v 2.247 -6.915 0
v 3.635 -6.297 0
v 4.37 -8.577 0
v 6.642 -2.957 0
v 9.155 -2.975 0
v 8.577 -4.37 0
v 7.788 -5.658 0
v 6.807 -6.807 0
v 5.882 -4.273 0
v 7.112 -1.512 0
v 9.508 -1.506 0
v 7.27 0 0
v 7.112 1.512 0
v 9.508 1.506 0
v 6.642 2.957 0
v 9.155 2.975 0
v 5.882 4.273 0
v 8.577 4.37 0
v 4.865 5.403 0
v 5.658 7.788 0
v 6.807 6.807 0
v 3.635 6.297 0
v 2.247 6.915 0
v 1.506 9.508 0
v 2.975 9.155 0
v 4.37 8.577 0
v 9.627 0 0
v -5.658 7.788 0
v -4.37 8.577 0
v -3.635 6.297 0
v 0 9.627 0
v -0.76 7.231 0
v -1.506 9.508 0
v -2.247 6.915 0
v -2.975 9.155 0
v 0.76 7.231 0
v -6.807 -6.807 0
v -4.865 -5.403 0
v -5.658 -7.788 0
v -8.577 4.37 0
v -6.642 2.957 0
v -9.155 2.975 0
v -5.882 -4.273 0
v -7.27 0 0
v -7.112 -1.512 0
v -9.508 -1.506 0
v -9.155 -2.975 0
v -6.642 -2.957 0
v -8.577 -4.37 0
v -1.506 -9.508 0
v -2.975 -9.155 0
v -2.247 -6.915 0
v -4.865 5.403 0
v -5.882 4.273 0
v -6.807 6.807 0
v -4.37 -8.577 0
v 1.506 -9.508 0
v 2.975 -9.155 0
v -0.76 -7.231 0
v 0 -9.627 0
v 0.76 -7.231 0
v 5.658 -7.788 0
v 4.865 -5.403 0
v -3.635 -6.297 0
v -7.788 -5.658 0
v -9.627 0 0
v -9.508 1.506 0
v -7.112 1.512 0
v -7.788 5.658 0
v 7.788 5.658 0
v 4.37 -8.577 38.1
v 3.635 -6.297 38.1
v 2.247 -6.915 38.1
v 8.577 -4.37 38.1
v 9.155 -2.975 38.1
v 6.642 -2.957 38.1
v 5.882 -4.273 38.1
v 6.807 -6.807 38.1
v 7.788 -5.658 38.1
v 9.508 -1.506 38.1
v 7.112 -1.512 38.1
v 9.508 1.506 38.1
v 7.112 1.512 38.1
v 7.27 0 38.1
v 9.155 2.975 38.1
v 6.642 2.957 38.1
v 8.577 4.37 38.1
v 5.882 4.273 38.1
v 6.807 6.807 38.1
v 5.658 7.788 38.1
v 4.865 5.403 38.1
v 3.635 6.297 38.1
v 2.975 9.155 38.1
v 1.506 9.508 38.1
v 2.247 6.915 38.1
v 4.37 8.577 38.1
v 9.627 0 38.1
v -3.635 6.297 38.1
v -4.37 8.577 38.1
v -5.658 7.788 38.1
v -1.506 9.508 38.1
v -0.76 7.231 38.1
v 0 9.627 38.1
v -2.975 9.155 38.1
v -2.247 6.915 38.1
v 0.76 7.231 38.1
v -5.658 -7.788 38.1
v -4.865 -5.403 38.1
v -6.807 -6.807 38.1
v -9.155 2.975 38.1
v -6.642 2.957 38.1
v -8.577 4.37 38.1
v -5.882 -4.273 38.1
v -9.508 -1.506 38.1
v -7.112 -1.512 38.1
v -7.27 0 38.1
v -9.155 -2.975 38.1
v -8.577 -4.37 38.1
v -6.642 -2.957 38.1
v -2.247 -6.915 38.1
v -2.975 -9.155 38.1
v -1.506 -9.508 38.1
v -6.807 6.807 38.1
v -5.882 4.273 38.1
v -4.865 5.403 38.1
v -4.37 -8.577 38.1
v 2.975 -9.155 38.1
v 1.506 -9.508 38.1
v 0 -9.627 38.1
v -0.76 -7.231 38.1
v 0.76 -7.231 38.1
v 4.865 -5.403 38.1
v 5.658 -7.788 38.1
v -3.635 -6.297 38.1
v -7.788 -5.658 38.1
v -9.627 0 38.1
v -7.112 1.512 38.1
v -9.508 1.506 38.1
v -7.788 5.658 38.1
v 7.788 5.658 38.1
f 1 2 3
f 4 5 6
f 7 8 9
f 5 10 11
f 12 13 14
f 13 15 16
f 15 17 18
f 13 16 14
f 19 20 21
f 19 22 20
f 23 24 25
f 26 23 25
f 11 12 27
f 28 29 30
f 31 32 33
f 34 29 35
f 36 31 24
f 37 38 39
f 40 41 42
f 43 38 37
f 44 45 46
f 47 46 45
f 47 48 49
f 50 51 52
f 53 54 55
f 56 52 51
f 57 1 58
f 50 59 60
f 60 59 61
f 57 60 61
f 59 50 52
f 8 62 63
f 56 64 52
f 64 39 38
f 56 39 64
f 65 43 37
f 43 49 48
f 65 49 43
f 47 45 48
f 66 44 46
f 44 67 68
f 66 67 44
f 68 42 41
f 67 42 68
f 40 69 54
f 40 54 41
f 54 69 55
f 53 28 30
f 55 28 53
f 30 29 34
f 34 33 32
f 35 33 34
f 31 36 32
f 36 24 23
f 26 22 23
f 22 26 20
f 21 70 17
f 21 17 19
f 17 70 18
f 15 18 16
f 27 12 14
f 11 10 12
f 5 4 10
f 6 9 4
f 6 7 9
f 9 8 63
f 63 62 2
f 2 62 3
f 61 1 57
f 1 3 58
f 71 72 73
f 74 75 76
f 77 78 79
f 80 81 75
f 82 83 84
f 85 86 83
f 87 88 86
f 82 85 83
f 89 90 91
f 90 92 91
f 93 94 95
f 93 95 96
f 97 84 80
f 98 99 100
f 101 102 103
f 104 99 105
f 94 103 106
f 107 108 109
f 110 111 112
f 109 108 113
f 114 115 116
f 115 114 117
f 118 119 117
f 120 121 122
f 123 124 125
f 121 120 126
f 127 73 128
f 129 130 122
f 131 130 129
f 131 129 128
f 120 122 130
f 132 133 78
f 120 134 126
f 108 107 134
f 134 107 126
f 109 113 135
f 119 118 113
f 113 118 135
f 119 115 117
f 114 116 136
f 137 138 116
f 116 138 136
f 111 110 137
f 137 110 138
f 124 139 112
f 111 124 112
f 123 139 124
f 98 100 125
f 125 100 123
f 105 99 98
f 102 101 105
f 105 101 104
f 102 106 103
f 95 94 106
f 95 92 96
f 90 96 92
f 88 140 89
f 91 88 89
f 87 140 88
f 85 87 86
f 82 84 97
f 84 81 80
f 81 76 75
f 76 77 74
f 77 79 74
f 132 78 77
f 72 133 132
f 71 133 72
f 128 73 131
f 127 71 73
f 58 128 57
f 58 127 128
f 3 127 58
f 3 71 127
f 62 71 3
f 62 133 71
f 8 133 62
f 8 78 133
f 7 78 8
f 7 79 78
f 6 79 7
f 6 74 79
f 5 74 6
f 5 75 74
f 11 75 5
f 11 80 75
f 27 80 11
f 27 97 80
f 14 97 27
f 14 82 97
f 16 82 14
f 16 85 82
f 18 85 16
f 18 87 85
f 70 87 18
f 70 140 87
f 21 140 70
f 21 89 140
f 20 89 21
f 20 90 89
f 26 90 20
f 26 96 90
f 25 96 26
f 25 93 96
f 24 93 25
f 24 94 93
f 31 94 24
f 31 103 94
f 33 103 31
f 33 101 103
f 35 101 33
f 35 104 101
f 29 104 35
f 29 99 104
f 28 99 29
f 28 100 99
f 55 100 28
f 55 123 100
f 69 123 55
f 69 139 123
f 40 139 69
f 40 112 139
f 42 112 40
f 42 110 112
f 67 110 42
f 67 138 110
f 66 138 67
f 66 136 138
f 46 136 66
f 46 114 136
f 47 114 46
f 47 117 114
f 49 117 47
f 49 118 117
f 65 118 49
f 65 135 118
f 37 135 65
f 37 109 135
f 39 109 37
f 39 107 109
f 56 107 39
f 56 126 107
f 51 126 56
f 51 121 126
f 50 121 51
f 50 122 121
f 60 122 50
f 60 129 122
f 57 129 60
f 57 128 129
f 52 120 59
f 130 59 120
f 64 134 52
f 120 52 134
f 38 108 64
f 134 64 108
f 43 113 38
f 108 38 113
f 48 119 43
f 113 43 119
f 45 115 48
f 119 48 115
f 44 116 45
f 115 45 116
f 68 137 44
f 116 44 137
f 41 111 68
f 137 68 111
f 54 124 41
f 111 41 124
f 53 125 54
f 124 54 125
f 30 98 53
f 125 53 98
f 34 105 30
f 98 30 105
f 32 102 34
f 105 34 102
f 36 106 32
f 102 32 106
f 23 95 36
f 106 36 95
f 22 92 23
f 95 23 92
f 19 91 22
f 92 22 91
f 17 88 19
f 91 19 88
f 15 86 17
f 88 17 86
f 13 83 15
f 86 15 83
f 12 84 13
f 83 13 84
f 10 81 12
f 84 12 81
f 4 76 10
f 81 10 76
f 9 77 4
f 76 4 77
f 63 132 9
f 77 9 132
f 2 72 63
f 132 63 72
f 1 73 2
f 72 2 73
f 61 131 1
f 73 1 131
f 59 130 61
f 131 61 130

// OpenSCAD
// file: ../Components/Pipe Insert.scad
use <../Vitamins/Pipe.scad>;

//Spec_TubingThreeQuarterByFiveEighthInch
//Spec_PipeThreeQuarterInchSch80
//Spec_PipeThreeQuarterInchSch80Stainless
//Spec_PipeOneInchSch80
module PipeInsert2d(pipeSpec=Spec_PipeThreeQuarterInchSch80Stainless(),
                    pipeClearance=PipeClearanceSnug(),
                    length=1) {
  outsideRadius = PipeInnerRadius(pipe=pipeSpec, clearance=pipeClearance, clearanceSign=-1);
  
  difference() {
    circle(r=outsideRadius, $fn=PipeFn(pipeSpec));
    children();
  }
}

scale(25.4)
render()
linear_extrude(height=1.5)
PipeInsert2d(pipeClearance=undef)
circle(r=(3/8/2)+0.002, $fn=20);
// file: ../Vitamins/Rod.scad
RodDiameter       = 1;
RodRadius         = 2;
RodClearanceSnug  = 3;
RodClearanceLoose = 4;
RodFn             = 5;

function RodClearanceSnug()  = RodClearanceSnug;
function RodClearanceLoose() = RodClearanceLoose;

RodBicNozzle = [
  [RodDiameter, 0.093],
  [RodRadius, 0.093/2],
  [RodClearanceSnug, 0.04],
  [RodClearanceLoose, 0.06],
  [RodFn, 5]
];
function Spec_RodBicNozzle() = RodBicNozzle;

RodBicFlint = [
  [RodDiameter, 0.0985],
  [RodRadius, 0.0985/2],
  [RodClearanceSnug, 0.04],
  [RodClearanceLoose, 0.06],
  [RodFn, 5]
];
function Spec_RodBicFlint() = RodBicFlint;

RodOneEighthInch = [
  [RodDiameter, 1/8],
  [RodRadius, 1/8/2],
  [RodClearanceSnug, 0.01],
  [RodClearanceLoose, 0.02],
  [RodFn, 8]
];
function Spec_RodOneEighthInch() = RodOneEighthInch;

RodOneQuarterInch = [
  [RodDiameter,       1/4],
  [RodRadius,         1/4/2],
  [RodClearanceSnug,  0.027],
  [RodClearanceLoose, 0.035],
  [RodFn,             12]
];
function Spec_RodOneQuarterInch() = RodOneQuarterInch;

RodFiveSixteenthInch = [
  [RodDiameter,       5/16],
  [RodRadius,         5/16/2],
  [RodClearanceSnug,  0.025],
  [RodClearanceLoose, 0.03],
  [RodFn,             16]
];
function Spec_RodFiveSixteenthInch() = RodFiveSixteenthInch;

RodThreeQuarterInchTubing = [
  [RodDiameter,       0.758],
  [RodRadius,         0.758/2],
  [RodClearanceSnug,  0.023],
  [RodClearanceLoose, 0.029],
  [RodFn,             30]
];
function Spec_RodThreeQuarterInchTubing() = RodThreeQuarterInchTubing;

/**
 * Lookup the diameter of a rod.
 * @param rod The rod to lookup.
 * @param clearance The RodClearance to use.
 */
function RodDiameter(rod=undef, clearance=undef)
           = lookup(RodDiameter, rod)
          + (clearance != undef ? lookup(clearance, rod) : 0);

/**
 * Lookup the radius of a rod.
 * @param rod The rod to lookup.
 * @param clearance The RodClearance to use.
 */
function RodRadius(rod=undef, clearance=undef) = RodDiameter(rod, clearance)/2;

/**
 * Lookup the $fn value for a rod, optionally overriding it
 * @param rod The rod to lookup.
 * @param $fn Override the RodFn. If defined, this will be the result. (convenience arg)
 **/
function RodFn(rod=undef, $fn=undef) = ($fn == undef) ? lookup(RodFn, rod) : $fn;

/**
 * A 2D rod (circle).
 * @param rod The rod to render.
 * @param clearance The RodClearance to use.
 * @param $fn Override the RodFn value of the rod.
 */
module Rod2d(rod=RodOneQuarterInch, clearance=undef, $fn=undef) {
  circle(r=RodRadius(rod, clearance),
         $fn=RodFn(rod, $fn));
}


module Rod(rod=RodOneQuarterInch, length=1, clearance=undef, center=false, $fn=undef) {
  render(convexity=1)
  linear_extrude(height=length, center=center)
  Rod2d(rod, clearance, $fn=$fn);
}
// main file
use <../Vitamins/Pipe.scad>;
use <../Vitamins/Rod.scad>;
use <../Components/Pipe Insert.scad>;

//Spec_PipeThreeQuarterInchSch80
//Spec_PipeOneInchSch80
module BarrelGuide(length=1,
                   pipeSpec=Spec_PipeOneInchSch80(),
                   barrelDiameter=9/16, barrelClearance=0.005) {
  barrelRadius = barrelDiameter/2;

  linear_extrude(height=length)
  PipeInsert2d()
  circle(r=barrelRadius+barrelClearance, $fn=30);
}

scale(25.4)
BarrelGuide(length=1.5);
